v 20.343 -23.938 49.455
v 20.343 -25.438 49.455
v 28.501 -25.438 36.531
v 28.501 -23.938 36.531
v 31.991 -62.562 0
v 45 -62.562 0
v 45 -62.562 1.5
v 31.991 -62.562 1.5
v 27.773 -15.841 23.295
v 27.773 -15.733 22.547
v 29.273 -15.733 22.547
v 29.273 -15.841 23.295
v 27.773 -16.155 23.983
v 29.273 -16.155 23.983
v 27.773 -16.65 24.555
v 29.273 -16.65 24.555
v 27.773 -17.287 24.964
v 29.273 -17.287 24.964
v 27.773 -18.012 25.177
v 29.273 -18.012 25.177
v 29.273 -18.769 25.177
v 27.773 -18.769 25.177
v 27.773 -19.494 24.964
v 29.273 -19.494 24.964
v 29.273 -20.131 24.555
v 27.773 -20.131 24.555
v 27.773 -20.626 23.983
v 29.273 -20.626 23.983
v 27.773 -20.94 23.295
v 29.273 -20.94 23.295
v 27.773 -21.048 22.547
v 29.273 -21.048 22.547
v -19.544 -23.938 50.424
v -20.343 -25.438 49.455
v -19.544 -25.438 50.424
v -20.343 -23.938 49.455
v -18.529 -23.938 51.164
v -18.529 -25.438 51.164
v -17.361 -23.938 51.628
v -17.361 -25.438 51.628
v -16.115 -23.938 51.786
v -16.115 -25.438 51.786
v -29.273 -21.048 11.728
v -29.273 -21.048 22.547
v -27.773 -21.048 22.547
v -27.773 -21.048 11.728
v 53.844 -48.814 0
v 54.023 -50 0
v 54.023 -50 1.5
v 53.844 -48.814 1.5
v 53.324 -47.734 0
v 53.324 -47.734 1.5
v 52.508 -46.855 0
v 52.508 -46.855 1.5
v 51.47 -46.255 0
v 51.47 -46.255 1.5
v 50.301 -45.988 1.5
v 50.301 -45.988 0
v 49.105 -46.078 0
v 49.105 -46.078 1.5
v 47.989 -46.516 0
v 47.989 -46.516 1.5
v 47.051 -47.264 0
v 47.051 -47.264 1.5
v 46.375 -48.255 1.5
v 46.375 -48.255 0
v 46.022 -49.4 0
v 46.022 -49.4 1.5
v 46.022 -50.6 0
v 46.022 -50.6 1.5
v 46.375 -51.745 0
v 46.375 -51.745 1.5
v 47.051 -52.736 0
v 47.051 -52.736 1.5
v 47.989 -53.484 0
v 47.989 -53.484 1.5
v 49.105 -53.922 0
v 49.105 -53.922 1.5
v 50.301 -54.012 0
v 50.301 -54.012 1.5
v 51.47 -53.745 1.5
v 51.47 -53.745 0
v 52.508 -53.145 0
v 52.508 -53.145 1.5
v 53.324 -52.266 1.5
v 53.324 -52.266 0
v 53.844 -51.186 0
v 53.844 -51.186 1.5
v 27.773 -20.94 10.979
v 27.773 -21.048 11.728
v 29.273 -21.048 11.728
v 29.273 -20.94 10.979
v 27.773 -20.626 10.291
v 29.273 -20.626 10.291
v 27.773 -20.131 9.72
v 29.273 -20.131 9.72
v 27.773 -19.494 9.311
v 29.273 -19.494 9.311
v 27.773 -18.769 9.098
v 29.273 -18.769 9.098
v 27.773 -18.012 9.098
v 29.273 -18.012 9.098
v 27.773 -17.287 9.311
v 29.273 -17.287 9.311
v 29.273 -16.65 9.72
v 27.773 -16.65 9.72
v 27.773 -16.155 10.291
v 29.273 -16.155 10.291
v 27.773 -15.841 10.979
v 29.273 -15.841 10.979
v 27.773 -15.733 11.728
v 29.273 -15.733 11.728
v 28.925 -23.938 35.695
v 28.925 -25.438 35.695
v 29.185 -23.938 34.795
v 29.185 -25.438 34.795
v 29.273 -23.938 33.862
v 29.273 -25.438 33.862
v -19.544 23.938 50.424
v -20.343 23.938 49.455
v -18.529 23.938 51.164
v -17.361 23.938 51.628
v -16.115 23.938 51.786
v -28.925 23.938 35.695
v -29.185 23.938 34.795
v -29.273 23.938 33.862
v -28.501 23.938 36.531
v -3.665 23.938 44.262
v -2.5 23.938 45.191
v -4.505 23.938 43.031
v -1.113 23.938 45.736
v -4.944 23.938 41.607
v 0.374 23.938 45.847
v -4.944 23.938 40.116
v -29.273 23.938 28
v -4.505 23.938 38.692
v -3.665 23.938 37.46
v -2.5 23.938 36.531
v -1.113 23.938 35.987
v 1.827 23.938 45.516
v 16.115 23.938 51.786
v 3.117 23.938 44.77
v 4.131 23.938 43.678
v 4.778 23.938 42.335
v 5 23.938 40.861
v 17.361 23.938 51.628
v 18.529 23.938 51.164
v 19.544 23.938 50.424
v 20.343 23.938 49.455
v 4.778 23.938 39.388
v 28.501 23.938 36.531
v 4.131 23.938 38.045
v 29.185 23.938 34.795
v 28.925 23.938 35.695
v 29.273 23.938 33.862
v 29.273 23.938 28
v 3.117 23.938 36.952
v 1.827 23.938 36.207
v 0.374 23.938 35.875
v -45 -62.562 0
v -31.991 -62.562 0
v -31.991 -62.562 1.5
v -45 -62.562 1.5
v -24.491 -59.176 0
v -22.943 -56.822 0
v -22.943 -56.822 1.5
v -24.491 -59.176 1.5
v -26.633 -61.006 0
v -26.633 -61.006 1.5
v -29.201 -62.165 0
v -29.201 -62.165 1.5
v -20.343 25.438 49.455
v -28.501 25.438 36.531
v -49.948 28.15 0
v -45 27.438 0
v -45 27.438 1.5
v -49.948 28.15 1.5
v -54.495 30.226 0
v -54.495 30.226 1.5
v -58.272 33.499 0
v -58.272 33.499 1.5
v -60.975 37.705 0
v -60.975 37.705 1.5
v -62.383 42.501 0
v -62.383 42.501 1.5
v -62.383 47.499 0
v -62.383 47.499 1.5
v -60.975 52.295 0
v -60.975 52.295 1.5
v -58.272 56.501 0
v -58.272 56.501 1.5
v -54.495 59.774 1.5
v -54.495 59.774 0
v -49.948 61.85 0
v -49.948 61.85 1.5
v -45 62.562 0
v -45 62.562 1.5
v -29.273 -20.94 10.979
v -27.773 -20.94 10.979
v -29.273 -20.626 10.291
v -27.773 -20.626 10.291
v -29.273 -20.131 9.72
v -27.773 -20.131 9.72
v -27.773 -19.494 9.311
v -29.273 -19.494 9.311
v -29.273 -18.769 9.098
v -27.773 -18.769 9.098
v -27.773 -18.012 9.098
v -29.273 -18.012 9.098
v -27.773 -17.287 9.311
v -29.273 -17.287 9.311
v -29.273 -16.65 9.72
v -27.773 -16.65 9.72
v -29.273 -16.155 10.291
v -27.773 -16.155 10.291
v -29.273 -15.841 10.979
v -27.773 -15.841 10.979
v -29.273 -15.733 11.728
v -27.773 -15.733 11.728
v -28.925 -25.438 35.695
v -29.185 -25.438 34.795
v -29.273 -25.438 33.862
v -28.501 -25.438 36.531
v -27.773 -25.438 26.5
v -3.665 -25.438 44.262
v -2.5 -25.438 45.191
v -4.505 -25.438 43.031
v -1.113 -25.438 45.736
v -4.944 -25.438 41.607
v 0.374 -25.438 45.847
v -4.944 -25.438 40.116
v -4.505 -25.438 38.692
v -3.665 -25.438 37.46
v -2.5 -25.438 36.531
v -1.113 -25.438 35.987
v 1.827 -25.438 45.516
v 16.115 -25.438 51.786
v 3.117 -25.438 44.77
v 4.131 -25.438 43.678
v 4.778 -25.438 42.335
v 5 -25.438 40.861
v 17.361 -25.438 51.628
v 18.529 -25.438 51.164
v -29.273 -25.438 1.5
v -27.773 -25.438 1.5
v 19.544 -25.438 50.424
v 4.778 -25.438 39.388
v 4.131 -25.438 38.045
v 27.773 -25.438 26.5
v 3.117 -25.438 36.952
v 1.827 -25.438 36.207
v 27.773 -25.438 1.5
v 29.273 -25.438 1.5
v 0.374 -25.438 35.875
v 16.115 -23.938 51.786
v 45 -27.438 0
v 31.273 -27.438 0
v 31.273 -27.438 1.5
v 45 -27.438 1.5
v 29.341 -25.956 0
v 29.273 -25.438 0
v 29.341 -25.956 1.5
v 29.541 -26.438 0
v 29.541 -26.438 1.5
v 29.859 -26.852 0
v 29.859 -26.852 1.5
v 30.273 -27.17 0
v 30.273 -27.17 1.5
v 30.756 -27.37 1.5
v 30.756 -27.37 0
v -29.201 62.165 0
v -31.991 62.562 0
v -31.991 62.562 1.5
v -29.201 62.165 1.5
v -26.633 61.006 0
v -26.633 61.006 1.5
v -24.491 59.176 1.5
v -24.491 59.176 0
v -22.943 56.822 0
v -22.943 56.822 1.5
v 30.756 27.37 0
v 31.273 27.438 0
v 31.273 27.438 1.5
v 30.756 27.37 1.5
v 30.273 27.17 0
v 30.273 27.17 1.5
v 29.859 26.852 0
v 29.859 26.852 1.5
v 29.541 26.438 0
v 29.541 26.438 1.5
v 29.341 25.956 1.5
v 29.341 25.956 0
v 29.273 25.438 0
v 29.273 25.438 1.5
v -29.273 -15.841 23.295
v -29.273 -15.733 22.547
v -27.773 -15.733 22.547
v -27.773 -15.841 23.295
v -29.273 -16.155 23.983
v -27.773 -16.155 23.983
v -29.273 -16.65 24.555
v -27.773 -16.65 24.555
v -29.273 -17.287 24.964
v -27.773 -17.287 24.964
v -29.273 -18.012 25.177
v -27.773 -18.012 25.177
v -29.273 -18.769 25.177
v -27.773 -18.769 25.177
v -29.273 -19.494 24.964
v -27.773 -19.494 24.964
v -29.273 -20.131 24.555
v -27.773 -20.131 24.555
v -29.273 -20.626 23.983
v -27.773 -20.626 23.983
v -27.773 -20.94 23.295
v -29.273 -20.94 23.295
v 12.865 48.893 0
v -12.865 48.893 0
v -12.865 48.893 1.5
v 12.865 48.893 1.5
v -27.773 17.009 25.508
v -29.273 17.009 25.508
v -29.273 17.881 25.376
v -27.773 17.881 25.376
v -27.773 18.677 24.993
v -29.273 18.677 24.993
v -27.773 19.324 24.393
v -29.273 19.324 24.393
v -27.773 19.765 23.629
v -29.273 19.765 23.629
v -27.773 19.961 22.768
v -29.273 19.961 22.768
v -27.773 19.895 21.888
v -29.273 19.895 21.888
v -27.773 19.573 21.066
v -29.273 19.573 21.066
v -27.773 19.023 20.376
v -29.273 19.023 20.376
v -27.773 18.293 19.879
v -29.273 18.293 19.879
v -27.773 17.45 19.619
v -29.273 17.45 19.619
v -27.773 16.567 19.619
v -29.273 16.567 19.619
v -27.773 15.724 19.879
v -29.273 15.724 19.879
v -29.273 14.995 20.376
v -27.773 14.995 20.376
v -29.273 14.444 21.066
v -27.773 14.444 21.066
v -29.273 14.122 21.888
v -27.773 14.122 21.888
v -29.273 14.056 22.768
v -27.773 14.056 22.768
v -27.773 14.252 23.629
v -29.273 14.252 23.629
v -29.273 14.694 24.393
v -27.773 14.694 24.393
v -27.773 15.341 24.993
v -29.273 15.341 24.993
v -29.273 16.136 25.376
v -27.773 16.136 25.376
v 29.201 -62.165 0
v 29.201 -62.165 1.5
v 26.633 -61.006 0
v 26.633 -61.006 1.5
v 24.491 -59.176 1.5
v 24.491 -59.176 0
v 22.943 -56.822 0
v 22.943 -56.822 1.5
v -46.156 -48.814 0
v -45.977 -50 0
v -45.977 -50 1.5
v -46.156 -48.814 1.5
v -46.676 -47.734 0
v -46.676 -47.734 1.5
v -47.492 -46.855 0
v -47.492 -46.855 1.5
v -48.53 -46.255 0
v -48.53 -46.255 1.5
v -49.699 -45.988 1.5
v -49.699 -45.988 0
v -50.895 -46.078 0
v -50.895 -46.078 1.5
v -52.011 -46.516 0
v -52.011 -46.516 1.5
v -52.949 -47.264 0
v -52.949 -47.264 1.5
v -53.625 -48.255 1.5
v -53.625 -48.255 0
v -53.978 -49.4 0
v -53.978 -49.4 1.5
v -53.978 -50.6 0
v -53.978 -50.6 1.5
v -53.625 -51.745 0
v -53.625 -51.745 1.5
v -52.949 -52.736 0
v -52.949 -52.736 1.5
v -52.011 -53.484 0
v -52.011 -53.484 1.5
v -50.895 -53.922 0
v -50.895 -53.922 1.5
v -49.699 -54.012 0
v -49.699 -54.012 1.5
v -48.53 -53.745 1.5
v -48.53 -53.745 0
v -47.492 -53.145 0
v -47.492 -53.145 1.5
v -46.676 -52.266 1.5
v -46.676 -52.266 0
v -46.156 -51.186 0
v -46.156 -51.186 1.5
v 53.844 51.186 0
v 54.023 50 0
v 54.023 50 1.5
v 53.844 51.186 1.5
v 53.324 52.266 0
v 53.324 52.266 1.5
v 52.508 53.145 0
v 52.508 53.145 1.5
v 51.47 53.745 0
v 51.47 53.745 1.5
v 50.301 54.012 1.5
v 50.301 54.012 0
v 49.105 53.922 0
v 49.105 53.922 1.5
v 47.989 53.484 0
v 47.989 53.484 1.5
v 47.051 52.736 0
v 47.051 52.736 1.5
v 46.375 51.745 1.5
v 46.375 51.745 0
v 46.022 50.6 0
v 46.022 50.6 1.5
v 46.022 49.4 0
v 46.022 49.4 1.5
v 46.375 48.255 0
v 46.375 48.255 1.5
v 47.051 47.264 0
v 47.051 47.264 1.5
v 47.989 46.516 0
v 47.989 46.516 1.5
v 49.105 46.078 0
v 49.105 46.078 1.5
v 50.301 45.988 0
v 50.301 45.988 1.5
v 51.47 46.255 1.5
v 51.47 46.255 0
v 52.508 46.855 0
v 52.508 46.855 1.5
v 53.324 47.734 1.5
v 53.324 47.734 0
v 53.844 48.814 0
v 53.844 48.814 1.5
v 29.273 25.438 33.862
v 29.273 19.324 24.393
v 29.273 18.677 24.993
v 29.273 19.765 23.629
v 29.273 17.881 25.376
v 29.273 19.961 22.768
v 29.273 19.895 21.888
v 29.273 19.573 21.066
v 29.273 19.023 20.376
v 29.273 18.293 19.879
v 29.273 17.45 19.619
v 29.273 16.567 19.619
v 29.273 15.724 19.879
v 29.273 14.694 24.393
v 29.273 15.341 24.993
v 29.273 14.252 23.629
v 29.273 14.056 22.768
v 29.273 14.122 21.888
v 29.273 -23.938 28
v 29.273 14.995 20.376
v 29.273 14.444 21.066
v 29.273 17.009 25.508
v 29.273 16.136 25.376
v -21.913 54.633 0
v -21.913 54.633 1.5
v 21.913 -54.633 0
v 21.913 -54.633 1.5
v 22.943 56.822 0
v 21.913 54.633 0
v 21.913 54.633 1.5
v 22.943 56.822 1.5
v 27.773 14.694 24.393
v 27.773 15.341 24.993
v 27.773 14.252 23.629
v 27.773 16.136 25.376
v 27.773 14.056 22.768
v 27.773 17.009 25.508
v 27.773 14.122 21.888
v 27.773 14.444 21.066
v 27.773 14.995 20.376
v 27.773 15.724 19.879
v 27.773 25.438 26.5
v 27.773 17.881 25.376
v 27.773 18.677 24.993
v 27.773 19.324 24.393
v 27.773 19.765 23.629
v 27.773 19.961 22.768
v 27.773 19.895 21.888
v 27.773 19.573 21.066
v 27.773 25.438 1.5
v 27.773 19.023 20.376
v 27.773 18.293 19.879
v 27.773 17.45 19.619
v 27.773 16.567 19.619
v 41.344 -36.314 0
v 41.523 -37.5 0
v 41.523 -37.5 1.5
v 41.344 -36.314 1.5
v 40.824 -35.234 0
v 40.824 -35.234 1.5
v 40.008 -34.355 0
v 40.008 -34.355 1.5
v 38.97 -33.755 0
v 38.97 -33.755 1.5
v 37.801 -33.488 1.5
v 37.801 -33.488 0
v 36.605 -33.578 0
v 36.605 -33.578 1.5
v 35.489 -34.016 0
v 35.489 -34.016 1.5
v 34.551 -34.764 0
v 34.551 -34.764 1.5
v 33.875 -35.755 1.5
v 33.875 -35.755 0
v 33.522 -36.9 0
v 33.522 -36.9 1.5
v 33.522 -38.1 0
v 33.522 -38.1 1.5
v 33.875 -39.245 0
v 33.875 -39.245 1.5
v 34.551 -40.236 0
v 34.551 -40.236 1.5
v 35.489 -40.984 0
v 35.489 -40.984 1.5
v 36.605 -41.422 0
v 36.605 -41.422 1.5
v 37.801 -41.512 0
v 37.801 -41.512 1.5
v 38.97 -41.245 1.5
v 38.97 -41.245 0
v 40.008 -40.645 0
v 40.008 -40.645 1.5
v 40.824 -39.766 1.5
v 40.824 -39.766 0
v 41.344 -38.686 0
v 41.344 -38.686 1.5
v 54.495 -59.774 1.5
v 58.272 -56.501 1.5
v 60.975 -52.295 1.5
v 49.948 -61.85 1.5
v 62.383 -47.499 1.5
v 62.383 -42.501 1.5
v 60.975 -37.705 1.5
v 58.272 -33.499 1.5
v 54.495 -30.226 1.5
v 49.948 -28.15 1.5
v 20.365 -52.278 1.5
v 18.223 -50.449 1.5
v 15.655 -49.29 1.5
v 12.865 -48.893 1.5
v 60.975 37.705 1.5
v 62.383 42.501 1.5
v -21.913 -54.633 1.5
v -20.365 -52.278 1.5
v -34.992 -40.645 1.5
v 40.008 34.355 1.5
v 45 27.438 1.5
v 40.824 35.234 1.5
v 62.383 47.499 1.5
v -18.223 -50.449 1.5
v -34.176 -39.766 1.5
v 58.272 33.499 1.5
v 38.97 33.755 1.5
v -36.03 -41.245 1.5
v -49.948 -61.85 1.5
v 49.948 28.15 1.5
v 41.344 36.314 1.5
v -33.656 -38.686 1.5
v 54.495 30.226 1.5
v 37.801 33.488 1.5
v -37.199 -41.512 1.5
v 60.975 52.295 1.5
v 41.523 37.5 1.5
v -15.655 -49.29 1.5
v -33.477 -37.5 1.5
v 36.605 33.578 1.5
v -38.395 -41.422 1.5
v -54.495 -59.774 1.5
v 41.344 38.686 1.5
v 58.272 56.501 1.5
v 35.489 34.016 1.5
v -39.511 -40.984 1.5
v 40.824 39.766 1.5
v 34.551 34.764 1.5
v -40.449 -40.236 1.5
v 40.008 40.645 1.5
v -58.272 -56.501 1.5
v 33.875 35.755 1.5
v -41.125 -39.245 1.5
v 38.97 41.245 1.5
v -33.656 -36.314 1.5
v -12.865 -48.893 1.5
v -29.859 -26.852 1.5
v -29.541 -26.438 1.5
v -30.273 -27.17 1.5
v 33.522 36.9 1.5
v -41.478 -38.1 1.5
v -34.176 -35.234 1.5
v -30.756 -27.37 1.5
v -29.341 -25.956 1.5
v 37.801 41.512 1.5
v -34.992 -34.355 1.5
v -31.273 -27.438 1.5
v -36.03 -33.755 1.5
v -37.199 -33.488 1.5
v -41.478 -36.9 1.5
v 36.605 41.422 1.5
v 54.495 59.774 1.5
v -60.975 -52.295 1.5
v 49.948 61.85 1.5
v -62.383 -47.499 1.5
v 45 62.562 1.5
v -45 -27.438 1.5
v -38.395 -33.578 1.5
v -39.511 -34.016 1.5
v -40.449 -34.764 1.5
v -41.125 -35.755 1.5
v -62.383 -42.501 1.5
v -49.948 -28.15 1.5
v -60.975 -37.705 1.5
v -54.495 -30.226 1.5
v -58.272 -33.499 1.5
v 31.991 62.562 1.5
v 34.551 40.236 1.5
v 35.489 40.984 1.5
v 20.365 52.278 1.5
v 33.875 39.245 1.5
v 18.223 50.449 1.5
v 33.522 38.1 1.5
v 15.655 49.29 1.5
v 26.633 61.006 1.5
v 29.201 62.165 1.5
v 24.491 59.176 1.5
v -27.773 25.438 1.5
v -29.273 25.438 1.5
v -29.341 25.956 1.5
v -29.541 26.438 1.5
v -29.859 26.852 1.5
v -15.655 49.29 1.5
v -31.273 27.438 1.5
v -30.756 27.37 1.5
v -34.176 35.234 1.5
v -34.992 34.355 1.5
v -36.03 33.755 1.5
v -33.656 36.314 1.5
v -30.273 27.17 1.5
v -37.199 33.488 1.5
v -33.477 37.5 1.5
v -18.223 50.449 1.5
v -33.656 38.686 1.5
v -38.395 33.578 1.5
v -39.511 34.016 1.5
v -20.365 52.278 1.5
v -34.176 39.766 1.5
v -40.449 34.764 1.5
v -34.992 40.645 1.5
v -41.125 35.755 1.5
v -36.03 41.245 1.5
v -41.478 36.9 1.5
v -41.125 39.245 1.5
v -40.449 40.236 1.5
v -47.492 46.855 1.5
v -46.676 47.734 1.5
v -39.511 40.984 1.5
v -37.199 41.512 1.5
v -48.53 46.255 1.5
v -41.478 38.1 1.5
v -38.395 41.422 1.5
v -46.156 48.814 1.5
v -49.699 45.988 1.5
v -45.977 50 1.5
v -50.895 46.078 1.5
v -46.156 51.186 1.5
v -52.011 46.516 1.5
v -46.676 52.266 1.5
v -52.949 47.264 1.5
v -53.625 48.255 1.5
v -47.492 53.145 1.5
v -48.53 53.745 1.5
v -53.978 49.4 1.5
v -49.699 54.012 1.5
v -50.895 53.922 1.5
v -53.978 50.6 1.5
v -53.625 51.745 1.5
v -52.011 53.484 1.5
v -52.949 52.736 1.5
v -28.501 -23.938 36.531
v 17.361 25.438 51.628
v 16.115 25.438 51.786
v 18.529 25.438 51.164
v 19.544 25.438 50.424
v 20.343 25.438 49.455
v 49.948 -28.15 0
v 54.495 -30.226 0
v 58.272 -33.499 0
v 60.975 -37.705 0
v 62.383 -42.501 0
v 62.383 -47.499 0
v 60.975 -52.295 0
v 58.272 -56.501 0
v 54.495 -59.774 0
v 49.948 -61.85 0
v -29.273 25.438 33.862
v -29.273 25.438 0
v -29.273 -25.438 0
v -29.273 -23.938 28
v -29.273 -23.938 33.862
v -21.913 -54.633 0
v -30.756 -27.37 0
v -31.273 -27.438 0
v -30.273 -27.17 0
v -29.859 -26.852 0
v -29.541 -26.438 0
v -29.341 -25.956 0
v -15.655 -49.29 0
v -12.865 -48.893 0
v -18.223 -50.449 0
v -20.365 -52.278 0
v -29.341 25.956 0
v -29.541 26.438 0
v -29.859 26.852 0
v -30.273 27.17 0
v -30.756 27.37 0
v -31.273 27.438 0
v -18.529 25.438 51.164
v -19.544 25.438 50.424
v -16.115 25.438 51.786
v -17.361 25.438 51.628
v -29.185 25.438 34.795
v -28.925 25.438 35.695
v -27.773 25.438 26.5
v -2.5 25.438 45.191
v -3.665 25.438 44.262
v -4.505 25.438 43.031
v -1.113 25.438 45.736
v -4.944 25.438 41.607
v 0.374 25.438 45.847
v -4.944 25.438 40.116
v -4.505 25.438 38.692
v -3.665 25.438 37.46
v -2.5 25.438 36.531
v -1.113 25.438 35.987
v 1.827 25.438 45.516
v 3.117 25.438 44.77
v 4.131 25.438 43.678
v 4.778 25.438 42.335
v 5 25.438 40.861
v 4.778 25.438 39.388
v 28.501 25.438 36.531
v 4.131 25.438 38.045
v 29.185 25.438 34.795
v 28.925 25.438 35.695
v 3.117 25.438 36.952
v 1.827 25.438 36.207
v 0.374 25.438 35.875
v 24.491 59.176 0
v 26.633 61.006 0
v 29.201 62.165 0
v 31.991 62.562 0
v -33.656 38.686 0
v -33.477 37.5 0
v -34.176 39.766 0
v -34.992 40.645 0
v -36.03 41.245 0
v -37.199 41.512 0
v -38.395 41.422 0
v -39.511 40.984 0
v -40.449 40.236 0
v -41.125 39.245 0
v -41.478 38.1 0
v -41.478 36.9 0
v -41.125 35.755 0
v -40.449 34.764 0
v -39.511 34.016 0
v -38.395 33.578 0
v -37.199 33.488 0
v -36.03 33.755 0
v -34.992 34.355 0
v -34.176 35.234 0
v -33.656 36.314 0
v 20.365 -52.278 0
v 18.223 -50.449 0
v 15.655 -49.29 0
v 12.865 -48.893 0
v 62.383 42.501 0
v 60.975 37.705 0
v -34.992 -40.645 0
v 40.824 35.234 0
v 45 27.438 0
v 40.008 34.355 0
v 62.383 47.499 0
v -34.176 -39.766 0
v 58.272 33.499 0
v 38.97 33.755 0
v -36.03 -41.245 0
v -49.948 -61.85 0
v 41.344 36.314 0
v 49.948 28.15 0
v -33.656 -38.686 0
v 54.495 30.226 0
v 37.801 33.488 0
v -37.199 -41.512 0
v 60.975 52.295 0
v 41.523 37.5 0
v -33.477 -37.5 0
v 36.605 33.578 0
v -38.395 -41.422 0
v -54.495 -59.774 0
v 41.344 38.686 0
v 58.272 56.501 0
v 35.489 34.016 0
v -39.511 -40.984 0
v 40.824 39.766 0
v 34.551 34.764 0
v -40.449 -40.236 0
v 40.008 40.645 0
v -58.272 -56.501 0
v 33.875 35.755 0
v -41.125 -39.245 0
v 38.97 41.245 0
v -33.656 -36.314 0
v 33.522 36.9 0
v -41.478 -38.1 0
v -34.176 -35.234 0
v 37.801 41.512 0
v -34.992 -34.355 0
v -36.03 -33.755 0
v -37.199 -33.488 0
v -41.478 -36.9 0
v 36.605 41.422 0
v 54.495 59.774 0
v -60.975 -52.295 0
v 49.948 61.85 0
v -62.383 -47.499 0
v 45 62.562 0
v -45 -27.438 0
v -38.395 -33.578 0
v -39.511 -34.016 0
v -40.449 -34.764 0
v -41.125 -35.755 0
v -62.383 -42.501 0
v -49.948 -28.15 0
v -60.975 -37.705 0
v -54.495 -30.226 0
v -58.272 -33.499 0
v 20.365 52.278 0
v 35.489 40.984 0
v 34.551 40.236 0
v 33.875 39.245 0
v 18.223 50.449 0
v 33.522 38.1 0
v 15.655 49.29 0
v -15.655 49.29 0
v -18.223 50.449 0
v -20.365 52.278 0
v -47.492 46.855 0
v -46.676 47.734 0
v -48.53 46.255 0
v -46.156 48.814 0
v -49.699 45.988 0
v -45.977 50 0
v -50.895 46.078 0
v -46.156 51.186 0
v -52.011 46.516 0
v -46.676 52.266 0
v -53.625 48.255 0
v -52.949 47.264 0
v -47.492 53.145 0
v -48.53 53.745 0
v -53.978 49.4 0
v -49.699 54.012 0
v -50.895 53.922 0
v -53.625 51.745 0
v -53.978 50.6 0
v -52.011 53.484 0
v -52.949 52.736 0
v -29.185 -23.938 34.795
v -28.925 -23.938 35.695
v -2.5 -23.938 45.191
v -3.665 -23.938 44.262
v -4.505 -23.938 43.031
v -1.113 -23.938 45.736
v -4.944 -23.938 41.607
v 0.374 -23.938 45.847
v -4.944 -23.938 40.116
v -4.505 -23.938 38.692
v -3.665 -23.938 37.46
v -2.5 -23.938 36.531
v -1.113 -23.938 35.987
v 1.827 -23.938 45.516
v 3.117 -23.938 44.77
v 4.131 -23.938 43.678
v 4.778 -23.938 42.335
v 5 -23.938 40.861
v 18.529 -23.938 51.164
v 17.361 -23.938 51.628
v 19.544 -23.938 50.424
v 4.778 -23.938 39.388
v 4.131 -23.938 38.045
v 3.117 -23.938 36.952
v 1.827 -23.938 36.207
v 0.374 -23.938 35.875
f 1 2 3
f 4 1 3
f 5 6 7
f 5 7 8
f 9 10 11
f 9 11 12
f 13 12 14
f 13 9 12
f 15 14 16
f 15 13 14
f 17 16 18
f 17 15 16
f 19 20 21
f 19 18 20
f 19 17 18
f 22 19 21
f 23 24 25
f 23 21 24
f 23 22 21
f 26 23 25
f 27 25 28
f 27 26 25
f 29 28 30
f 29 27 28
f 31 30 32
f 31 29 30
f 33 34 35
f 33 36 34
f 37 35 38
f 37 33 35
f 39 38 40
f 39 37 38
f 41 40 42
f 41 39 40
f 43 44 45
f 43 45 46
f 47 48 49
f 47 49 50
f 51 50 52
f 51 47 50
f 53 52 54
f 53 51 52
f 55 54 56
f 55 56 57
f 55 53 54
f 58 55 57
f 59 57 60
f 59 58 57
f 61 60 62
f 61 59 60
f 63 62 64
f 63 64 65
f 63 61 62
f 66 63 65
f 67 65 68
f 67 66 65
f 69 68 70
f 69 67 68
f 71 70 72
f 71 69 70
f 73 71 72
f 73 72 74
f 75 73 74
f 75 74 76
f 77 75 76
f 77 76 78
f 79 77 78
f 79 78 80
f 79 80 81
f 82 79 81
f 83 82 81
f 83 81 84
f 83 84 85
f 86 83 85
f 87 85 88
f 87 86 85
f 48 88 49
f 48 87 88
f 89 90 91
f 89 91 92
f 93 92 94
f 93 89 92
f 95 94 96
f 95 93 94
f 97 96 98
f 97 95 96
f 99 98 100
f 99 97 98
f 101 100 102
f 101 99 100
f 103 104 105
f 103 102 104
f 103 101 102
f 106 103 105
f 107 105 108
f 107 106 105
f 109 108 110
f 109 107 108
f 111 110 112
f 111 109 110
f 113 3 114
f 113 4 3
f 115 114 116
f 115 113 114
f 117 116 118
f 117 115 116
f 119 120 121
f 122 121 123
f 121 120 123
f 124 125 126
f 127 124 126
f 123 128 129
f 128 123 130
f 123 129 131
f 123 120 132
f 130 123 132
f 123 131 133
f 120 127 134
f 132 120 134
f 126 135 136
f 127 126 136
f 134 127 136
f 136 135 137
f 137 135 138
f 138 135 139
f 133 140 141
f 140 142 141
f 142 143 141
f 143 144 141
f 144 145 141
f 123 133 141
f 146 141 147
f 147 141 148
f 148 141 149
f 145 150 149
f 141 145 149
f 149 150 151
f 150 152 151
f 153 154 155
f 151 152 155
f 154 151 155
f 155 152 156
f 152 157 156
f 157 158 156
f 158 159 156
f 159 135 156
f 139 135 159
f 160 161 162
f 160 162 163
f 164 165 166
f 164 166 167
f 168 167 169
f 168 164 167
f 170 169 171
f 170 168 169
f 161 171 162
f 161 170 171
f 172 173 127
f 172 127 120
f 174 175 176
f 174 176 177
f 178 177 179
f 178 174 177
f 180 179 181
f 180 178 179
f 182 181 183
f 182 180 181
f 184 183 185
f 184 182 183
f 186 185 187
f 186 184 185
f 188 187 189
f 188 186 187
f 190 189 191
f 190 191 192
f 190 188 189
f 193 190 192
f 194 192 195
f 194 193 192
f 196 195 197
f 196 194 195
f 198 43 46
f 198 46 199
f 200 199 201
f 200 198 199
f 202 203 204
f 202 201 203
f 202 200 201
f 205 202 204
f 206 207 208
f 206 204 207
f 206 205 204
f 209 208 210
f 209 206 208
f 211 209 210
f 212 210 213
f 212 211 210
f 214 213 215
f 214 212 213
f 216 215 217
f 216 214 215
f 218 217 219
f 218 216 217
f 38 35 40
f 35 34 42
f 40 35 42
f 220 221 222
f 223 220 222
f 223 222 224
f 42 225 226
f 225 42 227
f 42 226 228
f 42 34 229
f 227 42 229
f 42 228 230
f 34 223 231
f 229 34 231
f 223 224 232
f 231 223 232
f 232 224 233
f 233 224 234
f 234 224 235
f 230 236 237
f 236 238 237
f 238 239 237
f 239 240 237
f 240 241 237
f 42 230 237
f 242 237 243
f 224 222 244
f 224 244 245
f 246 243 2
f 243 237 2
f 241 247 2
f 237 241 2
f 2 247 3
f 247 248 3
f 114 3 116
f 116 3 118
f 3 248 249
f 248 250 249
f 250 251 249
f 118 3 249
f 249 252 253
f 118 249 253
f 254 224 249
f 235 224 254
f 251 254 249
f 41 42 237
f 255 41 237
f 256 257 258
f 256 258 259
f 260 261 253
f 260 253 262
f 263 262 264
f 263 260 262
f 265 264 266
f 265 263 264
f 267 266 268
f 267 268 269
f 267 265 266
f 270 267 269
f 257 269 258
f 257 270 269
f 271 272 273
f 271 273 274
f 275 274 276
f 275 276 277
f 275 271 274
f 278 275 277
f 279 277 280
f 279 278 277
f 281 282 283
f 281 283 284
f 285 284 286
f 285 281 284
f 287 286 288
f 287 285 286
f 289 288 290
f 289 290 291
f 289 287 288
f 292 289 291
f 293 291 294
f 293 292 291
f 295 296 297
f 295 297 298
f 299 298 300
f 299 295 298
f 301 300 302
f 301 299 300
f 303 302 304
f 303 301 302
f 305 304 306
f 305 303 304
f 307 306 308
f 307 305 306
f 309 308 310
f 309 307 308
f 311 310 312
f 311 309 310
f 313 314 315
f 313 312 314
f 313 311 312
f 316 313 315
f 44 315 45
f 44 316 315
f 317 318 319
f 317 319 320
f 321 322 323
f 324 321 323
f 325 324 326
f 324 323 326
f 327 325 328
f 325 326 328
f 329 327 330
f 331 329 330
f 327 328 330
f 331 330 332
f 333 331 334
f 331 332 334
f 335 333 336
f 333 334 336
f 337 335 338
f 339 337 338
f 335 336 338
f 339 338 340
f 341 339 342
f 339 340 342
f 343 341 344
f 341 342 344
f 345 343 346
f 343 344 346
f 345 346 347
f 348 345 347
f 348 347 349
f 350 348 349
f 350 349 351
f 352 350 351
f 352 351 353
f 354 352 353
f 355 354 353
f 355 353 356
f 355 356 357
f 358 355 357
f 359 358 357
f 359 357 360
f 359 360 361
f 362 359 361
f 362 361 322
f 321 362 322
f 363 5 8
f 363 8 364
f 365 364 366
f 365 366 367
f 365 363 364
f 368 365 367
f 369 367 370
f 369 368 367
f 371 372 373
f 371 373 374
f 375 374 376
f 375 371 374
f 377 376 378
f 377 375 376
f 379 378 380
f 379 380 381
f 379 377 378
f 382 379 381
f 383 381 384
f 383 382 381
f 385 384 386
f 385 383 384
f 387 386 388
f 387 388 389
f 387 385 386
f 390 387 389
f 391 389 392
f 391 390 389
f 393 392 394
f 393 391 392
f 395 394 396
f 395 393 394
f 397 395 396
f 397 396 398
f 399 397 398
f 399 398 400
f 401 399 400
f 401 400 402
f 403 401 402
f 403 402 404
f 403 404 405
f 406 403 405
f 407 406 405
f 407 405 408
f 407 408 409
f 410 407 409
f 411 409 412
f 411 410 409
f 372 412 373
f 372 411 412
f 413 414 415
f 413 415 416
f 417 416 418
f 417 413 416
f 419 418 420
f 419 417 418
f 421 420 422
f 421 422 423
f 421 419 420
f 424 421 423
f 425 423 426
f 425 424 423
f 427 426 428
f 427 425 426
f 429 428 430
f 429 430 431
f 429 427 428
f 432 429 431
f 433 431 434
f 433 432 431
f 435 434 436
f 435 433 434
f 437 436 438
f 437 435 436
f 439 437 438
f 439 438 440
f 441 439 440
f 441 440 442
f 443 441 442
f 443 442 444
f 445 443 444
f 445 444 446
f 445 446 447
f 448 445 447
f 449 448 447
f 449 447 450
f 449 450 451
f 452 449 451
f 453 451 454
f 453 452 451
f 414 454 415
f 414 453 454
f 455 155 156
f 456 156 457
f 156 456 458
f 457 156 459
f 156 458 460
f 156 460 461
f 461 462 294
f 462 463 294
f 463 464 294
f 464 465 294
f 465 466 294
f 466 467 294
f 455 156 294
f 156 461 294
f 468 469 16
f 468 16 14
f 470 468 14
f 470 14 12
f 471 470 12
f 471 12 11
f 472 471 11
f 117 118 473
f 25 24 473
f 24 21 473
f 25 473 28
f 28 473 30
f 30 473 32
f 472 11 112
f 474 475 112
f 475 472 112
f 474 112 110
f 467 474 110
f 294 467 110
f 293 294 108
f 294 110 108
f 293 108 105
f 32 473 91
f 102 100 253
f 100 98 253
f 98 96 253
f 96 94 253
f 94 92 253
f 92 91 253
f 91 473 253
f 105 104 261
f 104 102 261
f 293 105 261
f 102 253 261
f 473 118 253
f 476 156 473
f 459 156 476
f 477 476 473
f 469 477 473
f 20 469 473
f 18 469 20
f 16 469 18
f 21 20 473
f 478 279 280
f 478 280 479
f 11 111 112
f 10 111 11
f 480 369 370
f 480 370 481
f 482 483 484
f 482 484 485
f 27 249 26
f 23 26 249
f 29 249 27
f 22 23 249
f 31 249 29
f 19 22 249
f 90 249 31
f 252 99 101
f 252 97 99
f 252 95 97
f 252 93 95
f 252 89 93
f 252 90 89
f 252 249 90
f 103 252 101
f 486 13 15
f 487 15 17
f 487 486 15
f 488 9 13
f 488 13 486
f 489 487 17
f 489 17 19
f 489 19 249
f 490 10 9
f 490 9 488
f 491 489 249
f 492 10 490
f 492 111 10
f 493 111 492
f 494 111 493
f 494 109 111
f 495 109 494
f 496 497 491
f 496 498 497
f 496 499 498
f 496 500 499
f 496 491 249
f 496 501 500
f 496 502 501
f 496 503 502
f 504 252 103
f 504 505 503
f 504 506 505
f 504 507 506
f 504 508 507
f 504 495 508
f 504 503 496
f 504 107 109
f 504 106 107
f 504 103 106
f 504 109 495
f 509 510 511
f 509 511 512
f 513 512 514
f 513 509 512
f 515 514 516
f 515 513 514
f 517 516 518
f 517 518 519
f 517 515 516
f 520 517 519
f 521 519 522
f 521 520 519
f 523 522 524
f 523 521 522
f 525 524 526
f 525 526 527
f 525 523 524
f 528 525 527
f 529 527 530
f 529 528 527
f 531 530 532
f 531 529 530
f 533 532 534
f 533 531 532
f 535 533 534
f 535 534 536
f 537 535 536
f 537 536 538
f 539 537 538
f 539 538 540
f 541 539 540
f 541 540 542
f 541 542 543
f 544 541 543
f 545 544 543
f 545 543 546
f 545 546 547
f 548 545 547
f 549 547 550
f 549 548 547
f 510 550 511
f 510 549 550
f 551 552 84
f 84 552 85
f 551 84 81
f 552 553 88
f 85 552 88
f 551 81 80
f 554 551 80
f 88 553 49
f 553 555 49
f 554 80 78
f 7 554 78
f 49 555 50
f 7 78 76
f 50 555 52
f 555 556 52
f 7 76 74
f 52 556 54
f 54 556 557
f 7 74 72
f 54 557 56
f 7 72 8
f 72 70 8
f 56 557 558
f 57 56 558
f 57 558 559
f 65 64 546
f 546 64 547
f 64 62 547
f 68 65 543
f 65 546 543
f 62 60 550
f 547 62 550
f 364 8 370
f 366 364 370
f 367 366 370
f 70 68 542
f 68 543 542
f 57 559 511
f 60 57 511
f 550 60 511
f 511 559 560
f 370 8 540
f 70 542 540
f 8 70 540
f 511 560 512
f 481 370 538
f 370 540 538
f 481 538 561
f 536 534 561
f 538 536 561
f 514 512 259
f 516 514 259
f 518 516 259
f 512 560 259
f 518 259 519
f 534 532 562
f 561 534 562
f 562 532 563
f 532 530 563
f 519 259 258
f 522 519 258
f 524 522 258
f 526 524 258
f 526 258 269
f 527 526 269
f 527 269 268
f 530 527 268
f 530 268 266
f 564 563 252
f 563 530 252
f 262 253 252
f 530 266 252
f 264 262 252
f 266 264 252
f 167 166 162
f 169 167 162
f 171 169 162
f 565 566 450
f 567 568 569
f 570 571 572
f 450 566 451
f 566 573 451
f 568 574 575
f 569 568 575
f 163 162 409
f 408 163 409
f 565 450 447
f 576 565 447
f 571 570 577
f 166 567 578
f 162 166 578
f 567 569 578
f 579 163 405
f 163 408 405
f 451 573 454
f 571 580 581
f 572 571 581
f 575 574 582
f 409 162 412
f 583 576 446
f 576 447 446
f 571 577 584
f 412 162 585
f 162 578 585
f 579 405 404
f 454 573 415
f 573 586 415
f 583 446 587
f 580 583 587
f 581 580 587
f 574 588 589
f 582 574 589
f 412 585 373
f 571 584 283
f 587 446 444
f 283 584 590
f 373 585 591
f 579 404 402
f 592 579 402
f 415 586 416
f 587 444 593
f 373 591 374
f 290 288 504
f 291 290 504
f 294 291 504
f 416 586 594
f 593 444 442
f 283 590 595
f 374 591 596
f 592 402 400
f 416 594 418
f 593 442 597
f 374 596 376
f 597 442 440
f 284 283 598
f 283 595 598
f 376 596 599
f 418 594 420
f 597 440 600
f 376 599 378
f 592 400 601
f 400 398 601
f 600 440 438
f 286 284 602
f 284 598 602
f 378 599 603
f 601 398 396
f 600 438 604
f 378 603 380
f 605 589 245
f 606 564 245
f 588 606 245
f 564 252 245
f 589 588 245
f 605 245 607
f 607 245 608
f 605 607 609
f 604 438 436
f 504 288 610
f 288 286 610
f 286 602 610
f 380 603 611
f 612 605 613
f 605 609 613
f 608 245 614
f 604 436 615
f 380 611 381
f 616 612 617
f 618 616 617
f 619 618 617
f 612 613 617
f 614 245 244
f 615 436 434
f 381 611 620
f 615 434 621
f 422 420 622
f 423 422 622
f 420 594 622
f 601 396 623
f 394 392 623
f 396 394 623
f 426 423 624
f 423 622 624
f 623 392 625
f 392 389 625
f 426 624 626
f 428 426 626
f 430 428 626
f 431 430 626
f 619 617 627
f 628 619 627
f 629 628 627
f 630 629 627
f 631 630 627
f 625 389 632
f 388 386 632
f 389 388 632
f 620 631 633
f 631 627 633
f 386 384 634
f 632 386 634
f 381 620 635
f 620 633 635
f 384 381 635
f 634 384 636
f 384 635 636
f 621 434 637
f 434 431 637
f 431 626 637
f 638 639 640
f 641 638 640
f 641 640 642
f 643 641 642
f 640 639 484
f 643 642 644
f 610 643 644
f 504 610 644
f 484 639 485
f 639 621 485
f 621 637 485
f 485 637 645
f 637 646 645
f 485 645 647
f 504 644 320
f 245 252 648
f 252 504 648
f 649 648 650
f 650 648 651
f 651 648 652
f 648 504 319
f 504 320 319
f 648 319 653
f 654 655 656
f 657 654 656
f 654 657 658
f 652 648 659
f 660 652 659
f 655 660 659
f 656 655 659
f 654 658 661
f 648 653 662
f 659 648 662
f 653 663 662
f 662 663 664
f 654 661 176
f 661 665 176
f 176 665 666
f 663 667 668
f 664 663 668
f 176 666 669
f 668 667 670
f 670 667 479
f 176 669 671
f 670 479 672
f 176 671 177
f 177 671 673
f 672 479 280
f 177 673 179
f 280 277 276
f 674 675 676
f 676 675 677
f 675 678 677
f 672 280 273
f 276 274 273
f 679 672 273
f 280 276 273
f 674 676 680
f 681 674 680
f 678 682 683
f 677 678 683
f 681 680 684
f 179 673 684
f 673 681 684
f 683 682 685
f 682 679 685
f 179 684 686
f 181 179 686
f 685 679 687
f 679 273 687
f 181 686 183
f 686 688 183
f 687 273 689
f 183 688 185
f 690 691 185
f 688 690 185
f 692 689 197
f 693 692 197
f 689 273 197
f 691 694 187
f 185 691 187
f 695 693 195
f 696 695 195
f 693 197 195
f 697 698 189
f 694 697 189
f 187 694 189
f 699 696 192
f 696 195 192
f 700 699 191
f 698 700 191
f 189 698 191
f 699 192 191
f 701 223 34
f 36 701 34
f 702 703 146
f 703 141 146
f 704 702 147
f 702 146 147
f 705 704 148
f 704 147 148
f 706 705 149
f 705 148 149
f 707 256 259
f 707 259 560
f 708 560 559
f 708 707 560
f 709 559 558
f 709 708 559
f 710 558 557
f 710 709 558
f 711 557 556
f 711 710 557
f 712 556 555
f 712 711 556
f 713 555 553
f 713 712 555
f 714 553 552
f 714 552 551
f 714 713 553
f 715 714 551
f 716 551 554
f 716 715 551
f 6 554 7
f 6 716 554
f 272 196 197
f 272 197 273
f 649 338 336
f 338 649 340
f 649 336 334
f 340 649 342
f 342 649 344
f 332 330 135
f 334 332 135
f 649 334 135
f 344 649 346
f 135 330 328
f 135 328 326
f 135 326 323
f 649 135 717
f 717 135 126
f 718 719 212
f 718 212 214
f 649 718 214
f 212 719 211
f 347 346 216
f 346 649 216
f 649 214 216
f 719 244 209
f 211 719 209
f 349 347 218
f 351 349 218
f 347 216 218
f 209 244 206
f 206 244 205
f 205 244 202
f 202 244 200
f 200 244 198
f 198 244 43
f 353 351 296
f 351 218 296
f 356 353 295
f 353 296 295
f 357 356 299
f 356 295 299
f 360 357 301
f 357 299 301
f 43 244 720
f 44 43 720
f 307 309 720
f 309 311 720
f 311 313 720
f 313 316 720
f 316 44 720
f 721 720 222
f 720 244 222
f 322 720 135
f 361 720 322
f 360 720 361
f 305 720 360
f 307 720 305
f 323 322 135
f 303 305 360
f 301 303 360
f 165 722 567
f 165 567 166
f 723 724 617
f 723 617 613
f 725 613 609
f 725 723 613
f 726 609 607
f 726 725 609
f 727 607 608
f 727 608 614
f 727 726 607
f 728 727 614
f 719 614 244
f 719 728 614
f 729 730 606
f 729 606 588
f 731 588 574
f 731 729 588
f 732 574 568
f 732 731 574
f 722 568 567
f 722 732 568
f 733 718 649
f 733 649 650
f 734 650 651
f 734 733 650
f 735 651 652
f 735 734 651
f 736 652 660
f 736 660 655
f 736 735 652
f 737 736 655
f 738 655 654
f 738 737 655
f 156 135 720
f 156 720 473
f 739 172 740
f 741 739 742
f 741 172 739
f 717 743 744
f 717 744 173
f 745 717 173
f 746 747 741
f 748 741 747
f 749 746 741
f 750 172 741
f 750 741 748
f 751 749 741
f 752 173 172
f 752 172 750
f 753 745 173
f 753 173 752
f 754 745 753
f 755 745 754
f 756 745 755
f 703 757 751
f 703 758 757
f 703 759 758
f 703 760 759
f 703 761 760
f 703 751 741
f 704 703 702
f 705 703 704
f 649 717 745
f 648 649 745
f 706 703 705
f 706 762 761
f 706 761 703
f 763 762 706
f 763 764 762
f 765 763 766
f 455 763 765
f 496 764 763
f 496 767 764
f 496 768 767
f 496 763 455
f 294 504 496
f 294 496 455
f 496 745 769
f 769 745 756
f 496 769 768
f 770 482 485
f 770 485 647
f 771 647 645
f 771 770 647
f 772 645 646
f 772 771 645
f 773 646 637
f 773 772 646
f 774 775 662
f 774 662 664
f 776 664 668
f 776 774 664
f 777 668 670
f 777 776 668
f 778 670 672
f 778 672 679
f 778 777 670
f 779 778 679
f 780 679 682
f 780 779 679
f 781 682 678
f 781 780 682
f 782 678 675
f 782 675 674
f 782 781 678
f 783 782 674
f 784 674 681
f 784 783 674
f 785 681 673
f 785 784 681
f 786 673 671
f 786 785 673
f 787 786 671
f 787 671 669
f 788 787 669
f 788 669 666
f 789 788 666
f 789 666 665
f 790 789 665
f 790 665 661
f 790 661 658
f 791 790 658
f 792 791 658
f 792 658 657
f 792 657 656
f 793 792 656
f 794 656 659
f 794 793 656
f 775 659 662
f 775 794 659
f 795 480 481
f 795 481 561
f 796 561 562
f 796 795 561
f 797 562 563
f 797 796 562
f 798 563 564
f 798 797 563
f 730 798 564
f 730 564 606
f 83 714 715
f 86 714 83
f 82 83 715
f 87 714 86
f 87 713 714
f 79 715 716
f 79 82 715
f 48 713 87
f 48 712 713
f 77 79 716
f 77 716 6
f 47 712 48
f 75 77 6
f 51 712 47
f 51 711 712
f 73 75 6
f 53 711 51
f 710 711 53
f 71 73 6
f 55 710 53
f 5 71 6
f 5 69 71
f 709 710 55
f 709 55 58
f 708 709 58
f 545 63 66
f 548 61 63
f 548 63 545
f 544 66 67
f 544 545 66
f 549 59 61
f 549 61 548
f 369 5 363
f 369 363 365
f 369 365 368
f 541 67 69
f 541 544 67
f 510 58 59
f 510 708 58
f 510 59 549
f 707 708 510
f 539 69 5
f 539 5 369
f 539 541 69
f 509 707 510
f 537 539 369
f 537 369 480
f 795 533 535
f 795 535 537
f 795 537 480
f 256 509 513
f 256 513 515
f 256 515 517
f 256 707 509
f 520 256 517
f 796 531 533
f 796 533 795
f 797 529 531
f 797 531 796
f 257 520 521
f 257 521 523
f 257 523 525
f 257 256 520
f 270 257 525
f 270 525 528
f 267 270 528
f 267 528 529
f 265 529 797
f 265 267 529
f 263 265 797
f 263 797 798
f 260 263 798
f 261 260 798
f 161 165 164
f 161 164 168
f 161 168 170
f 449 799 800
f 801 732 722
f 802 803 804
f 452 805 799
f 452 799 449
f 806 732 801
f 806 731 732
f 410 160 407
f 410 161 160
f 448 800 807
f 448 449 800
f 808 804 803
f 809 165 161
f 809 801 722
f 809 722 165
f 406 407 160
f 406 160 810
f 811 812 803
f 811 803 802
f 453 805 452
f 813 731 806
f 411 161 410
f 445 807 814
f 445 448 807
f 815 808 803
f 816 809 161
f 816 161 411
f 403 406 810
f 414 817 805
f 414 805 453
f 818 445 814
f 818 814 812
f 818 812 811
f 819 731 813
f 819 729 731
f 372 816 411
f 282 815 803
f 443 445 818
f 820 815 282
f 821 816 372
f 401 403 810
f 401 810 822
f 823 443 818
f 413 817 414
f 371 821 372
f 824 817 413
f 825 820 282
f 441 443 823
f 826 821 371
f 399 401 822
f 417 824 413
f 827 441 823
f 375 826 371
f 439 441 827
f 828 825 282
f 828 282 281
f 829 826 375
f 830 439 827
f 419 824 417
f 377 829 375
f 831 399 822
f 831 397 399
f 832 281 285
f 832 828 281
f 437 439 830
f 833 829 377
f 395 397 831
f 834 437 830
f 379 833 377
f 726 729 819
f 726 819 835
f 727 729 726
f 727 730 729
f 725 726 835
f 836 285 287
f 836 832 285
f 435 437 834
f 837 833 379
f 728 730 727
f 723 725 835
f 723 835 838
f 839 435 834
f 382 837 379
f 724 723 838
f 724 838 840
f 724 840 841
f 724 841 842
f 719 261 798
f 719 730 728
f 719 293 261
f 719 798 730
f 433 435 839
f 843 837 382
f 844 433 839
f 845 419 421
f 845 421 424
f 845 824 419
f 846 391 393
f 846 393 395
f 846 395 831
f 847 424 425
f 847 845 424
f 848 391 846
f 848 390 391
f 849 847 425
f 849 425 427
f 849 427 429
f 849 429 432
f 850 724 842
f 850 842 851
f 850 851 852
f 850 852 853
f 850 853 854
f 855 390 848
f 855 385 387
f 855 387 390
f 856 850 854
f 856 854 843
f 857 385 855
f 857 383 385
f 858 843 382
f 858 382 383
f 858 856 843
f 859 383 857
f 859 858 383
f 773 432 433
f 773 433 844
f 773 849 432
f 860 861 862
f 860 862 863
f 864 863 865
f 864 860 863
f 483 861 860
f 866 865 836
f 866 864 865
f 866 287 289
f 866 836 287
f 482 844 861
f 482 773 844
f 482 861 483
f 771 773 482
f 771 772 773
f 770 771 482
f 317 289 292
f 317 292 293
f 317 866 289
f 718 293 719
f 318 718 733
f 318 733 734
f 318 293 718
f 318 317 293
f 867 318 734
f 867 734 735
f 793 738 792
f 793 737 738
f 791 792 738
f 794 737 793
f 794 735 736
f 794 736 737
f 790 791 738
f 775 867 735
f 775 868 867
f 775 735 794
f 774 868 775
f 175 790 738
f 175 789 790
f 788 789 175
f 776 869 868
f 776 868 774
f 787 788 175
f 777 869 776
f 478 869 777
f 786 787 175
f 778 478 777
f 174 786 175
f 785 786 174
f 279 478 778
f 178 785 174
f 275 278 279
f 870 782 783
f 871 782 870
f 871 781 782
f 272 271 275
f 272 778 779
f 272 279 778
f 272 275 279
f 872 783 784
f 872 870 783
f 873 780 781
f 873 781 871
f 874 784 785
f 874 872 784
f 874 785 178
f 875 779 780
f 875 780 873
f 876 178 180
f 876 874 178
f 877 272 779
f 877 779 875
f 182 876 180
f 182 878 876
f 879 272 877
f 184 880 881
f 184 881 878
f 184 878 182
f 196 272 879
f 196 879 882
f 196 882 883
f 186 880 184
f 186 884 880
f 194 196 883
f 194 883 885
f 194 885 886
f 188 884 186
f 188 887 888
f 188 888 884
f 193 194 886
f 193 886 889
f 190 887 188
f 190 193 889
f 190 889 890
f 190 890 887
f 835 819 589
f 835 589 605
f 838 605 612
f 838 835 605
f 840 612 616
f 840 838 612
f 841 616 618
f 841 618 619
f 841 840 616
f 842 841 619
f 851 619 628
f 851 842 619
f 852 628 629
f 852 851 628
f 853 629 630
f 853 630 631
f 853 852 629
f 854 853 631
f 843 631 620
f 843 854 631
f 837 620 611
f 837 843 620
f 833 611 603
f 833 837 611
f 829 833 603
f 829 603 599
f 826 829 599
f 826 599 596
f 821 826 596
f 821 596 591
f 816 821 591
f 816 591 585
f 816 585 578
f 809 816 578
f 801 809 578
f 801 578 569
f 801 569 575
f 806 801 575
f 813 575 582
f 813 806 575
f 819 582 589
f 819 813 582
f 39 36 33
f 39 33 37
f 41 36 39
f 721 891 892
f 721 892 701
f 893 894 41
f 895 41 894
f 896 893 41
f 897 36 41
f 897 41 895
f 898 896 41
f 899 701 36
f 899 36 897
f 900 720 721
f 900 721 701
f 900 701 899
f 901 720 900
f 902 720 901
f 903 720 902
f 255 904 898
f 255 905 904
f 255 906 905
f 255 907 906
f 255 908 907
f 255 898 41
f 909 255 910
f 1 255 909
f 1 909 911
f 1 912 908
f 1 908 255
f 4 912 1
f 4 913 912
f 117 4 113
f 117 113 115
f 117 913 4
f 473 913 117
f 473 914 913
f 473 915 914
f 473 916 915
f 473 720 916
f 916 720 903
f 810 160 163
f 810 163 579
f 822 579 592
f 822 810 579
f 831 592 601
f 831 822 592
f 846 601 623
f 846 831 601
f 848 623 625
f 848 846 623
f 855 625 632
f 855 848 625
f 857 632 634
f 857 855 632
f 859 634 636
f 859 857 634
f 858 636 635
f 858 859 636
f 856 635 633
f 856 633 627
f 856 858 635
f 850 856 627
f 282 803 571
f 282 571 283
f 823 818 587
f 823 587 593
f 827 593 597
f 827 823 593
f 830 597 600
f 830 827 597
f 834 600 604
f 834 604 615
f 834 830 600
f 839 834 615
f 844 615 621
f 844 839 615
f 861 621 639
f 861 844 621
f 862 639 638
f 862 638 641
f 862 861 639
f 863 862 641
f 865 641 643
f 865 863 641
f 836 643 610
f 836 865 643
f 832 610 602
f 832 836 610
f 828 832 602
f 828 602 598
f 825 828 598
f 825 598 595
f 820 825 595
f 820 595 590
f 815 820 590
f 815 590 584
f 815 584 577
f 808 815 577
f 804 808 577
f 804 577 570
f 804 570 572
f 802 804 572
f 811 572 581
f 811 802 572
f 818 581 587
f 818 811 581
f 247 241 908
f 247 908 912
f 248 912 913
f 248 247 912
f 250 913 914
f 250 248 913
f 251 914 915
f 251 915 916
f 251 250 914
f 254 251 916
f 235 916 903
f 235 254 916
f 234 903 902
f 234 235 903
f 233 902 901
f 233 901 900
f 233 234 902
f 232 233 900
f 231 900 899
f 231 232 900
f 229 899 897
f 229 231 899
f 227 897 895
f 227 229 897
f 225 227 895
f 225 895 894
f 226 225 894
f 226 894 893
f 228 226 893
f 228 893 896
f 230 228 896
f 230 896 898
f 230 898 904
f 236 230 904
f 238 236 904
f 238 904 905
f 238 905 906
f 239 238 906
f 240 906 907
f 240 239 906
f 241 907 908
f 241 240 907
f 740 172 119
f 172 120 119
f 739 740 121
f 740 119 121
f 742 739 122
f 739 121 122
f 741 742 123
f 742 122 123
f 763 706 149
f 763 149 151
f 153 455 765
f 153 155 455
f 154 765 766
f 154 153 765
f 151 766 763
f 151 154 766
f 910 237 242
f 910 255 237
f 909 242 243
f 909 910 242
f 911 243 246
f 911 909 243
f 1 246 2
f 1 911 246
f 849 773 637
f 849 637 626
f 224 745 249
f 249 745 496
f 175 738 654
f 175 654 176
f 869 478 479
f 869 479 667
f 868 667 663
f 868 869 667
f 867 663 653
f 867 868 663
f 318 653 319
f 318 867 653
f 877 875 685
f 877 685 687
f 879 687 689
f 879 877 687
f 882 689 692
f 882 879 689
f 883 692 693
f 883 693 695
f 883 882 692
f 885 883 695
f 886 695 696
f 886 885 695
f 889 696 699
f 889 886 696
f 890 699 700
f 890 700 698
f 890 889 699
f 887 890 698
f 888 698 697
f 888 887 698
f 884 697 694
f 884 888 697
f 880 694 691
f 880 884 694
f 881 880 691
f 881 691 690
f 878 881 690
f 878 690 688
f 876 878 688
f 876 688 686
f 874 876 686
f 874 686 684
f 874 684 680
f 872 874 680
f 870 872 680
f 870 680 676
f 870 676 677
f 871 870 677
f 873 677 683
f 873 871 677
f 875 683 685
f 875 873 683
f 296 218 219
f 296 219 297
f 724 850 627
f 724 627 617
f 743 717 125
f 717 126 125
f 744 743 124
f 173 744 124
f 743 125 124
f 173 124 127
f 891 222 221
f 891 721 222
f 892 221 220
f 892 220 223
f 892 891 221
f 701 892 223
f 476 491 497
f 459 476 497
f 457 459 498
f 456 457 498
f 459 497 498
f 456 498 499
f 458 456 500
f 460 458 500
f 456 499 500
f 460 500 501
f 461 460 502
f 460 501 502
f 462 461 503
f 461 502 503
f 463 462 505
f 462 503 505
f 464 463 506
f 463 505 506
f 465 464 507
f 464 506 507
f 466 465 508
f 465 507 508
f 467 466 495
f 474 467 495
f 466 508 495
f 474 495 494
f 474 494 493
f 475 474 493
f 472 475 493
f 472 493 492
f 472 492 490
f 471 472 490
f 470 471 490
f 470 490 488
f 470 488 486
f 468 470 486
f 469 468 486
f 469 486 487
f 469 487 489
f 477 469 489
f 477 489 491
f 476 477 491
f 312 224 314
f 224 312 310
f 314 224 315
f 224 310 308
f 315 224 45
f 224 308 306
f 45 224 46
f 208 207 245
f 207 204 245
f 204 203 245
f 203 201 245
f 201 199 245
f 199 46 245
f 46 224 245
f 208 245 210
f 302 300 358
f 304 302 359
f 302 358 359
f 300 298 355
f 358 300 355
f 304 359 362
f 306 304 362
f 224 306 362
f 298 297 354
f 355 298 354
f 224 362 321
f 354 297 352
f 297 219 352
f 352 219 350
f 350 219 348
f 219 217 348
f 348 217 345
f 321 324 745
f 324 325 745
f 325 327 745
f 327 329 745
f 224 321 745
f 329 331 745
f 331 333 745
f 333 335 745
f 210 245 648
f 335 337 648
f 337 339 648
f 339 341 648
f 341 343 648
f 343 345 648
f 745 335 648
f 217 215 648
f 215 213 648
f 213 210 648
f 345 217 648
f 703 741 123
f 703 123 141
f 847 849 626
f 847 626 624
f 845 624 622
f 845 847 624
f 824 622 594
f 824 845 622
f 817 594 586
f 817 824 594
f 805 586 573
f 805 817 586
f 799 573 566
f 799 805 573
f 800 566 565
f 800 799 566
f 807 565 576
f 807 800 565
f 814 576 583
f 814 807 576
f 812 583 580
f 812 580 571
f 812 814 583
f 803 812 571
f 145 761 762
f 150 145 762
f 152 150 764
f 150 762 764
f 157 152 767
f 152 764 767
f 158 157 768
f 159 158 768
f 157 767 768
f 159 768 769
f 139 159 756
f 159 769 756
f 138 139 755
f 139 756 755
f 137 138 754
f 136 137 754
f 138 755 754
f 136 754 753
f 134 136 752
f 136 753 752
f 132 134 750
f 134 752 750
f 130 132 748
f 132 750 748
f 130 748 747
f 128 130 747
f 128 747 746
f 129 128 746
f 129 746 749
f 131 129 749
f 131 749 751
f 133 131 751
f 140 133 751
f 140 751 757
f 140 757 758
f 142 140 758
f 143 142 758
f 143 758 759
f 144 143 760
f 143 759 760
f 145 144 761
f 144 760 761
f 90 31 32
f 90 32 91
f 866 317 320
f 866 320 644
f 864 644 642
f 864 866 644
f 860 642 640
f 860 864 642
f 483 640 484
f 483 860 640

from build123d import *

# Parameters (mm, degrees)
SKETCH1_R           = 4.022928706
BOSS_EXTRUDE1_DEPTH = 1.5
SKETCH3_W           = 1.5
SKETCH3_H           = 50.876500294
BOSS_EXTRUDE2_DEPTH = 25
SKETCH4_W           = 58.54657641
SKETCH4_H           = 50.876500294
BOSS_EXTRUDE3_DEPTH = 1.5
SKETCH5_R           = 5
BOSS_EXTRUDE4_DEPTH = 1.5
SKETCH8_R           = 2.960999365
CUT_EXTRUDE1_DEPTH  = 92.835038059
FILLET1_R           = 5


with BuildPart() as part:
    # Sketch1 → Boss-Extrude1 (new body)
    with BuildSketch(Plane.XY):
        with BuildLine():
            Line((-31.273288205, 27.438250147), (-45, 27.438250147))
            ThreePointArc((-45, 27.438250147), (-62.561749853, 45), (-45, 62.561749853))
            Line((-45, 62.561749853), (-31.990503674, 62.561749853))
            ThreePointArc((-31.990503674, 62.561749853), (-26.633250489, 61.005673012), (-22.943256827, 56.821717516))
            Line((-22.943256827, 56.821717516), (-21.912531254, 54.632680079))
            ThreePointArc((-21.912531254, 54.632680079), (-18.222537592, 50.448724583), (-12.865284407, 48.892647742))
            Line((-12.865284407, 48.892647742), (12.865284407, 48.892647742))
            ThreePointArc((12.865284407, 48.892647742), (18.222537592, 50.448724583), (21.912531254, 54.632680079))
            Line((21.912531254, 54.632680079), (22.943256827, 56.821717516))
            ThreePointArc((22.943256827, 56.821717516), (26.633250489, 61.005673012), (31.990503674, 62.561749853))
            Line((31.990503674, 62.561749853), (45, 62.561749853))
            ThreePointArc((45, 62.561749853), (62.561749853, 45), (45, 27.438250147))
            Line((45, 27.438250147), (31.273288205, 27.438250147))
            ThreePointArc((31.273288205, 27.438250147), (29.859074643, 26.852463709), (29.273288205, 25.438250147))
            Line((29.273288205, 25.438250147), (29.273288205, -25.438250147))
            ThreePointArc((29.273288205, -25.438250147), (29.859074643, -26.852463709), (31.273288205, -27.438250147))
            Line((31.273288205, -27.438250147), (45, -27.438250147))
            ThreePointArc((45, -27.438250147), (62.561749853, -45), (45, -62.561749853))
            Line((45, -62.561749853), (31.990503674, -62.561749853))
            ThreePointArc((31.990503674, -62.561749853), (26.633250489, -61.005673012), (22.943256827, -56.821717516))
            Line((22.943256827, -56.821717516), (21.912531254, -54.632680079))
            ThreePointArc((21.912531254, -54.632680079), (18.222537592, -50.448724583), (12.865284407, -48.892647742))
            Line((12.865284407, -48.892647742), (-12.865284407, -48.892647742))
            ThreePointArc((-12.865284407, -48.892647742), (-18.222537592, -50.448724583), (-21.912531254, -54.632680079))
            Line((-21.912531254, -54.632680079), (-22.943256827, -56.821717516))
            ThreePointArc((-22.943256827, -56.821717516), (-26.633250489, -61.005673012), (-31.990503674, -62.561749853))
            Line((-31.990503674, -62.561749853), (-45, -62.561749853))
            ThreePointArc((-45, -62.561749853), (-62.561749853, -45), (-45, -27.438250147))
            Line((-45, -27.438250147), (-31.273288205, -27.438250147))
            ThreePointArc((-31.273288205, -27.438250147), (-29.859074643, -26.852463709), (-29.273288205, -25.438250147))
            Line((-29.273288205, -25.438250147), (-29.273288205, 25.438250147))
            ThreePointArc((-29.273288205, 25.438250147), (-29.859074643, 26.852463709), (-31.273288205, 27.438250147))
        make_face()
        with Locations((-50, 50)):
            Circle(SKETCH1_R, mode=Mode.SUBTRACT)
        with Locations((50, 50)):
            Circle(SKETCH1_R, mode=Mode.SUBTRACT)
        with Locations((-37.5, 37.5)):
            Circle(SKETCH1_R, mode=Mode.SUBTRACT)
        with Locations((37.5, 37.5)):
            Circle(SKETCH1_R, mode=Mode.SUBTRACT)
        with Locations((50, -50)):
            Circle(SKETCH1_R, mode=Mode.SUBTRACT)
        with Locations((37.5, -37.5)):
            Circle(SKETCH1_R, mode=Mode.SUBTRACT)
        with Locations((-37.5, -37.5)):
            Circle(SKETCH1_R, mode=Mode.SUBTRACT)
        with Locations((-50, -50)):
            Circle(SKETCH1_R, mode=Mode.SUBTRACT)
    extrude(amount=BOSS_EXTRUDE1_DEPTH)

    # Sketch3 → Boss-Extrude2 (add)
    with BuildSketch(Plane.XY.offset(1.5)):
        with Locations((-28.523288205, 0)):
            Rectangle(SKETCH3_W, SKETCH3_H)
        with Locations((28.523288205, 0)):
            Rectangle(SKETCH3_W, SKETCH3_H)
    extrude(amount=BOSS_EXTRUDE2_DEPTH)

    # Sketch4 → Boss-Extrude3 (add)
    with BuildSketch(Plane.XY.offset(26.5)):
        Rectangle(SKETCH4_W, SKETCH4_H)
    extrude(amount=BOSS_EXTRUDE3_DEPTH)

    # Sketch5 → Boss-Extrude4 (add)
    with BuildSketch(Plane(origin=(0, 25.438250147, 0), x_dir=(1, 0, 0), z_dir=(0, 1, 0))):
        Polygon((-29.273288205, -28), (-29.273288205, -35.308019153), (-18.871561113, -51.78577911), (18.871561113, -51.78577911), (29.273288205, -35.308019153), (29.273288205, -28), align=None)
        with Locations((0, -40.861297371)):
            Circle(SKETCH5_R, mode=Mode.SUBTRACT)
    boss_extrude4 = extrude(amount=-BOSS_EXTRUDE4_DEPTH)

    # Mirror1: Boss-Extrude4 across plane
    add(boss_extrude4.mirror(Plane.ZX))

    # Sketch8 → Cut-Extrude1 (cut, through all)
    with BuildSketch(Plane.ZY.offset(29.273288205)):
        with Locations((22.546846222, 17.00872447)):
            Circle(SKETCH8_R)
        with BuildLine():
            Line((11.727810079, -15.733095436), (22.546846222, -15.733095436))
            ThreePointArc((22.546846222, -15.733095436), (25.204153345, -18.390402559), (22.546846222, -21.047709682))
            Line((22.546846222, -21.047709682), (11.727810079, -21.047709682))
            ThreePointArc((11.727810079, -21.047709682), (9.070502956, -18.390402559), (11.727810079, -15.733095436))
        make_face()
    extrude(amount=-CUT_EXTRUDE1_DEPTH, mode=Mode.SUBTRACT)

    # Fillet1
    fillet1_edges = [part.edges().sort_by_distance(p)[0] for p in [
        (29.273288205, 24.688250147, 35.308019153),
        (18.871561113, 24.688250147, 51.78577911),
        (-18.871561113, 24.688250147, 51.78577911),
        (-29.273288205, 24.688250147, 35.308019153),
        (-29.273288205, -24.688250147, 35.308019153),
        (-18.871561113, -24.688250147, 51.78577911),
        (18.871561113, -24.688250147, 51.78577911),
        (29.273288205, -24.688250147, 35.308019153),
    ]]
    fillet(fillet1_edges, radius=FILLET1_R)


solid = part.part
